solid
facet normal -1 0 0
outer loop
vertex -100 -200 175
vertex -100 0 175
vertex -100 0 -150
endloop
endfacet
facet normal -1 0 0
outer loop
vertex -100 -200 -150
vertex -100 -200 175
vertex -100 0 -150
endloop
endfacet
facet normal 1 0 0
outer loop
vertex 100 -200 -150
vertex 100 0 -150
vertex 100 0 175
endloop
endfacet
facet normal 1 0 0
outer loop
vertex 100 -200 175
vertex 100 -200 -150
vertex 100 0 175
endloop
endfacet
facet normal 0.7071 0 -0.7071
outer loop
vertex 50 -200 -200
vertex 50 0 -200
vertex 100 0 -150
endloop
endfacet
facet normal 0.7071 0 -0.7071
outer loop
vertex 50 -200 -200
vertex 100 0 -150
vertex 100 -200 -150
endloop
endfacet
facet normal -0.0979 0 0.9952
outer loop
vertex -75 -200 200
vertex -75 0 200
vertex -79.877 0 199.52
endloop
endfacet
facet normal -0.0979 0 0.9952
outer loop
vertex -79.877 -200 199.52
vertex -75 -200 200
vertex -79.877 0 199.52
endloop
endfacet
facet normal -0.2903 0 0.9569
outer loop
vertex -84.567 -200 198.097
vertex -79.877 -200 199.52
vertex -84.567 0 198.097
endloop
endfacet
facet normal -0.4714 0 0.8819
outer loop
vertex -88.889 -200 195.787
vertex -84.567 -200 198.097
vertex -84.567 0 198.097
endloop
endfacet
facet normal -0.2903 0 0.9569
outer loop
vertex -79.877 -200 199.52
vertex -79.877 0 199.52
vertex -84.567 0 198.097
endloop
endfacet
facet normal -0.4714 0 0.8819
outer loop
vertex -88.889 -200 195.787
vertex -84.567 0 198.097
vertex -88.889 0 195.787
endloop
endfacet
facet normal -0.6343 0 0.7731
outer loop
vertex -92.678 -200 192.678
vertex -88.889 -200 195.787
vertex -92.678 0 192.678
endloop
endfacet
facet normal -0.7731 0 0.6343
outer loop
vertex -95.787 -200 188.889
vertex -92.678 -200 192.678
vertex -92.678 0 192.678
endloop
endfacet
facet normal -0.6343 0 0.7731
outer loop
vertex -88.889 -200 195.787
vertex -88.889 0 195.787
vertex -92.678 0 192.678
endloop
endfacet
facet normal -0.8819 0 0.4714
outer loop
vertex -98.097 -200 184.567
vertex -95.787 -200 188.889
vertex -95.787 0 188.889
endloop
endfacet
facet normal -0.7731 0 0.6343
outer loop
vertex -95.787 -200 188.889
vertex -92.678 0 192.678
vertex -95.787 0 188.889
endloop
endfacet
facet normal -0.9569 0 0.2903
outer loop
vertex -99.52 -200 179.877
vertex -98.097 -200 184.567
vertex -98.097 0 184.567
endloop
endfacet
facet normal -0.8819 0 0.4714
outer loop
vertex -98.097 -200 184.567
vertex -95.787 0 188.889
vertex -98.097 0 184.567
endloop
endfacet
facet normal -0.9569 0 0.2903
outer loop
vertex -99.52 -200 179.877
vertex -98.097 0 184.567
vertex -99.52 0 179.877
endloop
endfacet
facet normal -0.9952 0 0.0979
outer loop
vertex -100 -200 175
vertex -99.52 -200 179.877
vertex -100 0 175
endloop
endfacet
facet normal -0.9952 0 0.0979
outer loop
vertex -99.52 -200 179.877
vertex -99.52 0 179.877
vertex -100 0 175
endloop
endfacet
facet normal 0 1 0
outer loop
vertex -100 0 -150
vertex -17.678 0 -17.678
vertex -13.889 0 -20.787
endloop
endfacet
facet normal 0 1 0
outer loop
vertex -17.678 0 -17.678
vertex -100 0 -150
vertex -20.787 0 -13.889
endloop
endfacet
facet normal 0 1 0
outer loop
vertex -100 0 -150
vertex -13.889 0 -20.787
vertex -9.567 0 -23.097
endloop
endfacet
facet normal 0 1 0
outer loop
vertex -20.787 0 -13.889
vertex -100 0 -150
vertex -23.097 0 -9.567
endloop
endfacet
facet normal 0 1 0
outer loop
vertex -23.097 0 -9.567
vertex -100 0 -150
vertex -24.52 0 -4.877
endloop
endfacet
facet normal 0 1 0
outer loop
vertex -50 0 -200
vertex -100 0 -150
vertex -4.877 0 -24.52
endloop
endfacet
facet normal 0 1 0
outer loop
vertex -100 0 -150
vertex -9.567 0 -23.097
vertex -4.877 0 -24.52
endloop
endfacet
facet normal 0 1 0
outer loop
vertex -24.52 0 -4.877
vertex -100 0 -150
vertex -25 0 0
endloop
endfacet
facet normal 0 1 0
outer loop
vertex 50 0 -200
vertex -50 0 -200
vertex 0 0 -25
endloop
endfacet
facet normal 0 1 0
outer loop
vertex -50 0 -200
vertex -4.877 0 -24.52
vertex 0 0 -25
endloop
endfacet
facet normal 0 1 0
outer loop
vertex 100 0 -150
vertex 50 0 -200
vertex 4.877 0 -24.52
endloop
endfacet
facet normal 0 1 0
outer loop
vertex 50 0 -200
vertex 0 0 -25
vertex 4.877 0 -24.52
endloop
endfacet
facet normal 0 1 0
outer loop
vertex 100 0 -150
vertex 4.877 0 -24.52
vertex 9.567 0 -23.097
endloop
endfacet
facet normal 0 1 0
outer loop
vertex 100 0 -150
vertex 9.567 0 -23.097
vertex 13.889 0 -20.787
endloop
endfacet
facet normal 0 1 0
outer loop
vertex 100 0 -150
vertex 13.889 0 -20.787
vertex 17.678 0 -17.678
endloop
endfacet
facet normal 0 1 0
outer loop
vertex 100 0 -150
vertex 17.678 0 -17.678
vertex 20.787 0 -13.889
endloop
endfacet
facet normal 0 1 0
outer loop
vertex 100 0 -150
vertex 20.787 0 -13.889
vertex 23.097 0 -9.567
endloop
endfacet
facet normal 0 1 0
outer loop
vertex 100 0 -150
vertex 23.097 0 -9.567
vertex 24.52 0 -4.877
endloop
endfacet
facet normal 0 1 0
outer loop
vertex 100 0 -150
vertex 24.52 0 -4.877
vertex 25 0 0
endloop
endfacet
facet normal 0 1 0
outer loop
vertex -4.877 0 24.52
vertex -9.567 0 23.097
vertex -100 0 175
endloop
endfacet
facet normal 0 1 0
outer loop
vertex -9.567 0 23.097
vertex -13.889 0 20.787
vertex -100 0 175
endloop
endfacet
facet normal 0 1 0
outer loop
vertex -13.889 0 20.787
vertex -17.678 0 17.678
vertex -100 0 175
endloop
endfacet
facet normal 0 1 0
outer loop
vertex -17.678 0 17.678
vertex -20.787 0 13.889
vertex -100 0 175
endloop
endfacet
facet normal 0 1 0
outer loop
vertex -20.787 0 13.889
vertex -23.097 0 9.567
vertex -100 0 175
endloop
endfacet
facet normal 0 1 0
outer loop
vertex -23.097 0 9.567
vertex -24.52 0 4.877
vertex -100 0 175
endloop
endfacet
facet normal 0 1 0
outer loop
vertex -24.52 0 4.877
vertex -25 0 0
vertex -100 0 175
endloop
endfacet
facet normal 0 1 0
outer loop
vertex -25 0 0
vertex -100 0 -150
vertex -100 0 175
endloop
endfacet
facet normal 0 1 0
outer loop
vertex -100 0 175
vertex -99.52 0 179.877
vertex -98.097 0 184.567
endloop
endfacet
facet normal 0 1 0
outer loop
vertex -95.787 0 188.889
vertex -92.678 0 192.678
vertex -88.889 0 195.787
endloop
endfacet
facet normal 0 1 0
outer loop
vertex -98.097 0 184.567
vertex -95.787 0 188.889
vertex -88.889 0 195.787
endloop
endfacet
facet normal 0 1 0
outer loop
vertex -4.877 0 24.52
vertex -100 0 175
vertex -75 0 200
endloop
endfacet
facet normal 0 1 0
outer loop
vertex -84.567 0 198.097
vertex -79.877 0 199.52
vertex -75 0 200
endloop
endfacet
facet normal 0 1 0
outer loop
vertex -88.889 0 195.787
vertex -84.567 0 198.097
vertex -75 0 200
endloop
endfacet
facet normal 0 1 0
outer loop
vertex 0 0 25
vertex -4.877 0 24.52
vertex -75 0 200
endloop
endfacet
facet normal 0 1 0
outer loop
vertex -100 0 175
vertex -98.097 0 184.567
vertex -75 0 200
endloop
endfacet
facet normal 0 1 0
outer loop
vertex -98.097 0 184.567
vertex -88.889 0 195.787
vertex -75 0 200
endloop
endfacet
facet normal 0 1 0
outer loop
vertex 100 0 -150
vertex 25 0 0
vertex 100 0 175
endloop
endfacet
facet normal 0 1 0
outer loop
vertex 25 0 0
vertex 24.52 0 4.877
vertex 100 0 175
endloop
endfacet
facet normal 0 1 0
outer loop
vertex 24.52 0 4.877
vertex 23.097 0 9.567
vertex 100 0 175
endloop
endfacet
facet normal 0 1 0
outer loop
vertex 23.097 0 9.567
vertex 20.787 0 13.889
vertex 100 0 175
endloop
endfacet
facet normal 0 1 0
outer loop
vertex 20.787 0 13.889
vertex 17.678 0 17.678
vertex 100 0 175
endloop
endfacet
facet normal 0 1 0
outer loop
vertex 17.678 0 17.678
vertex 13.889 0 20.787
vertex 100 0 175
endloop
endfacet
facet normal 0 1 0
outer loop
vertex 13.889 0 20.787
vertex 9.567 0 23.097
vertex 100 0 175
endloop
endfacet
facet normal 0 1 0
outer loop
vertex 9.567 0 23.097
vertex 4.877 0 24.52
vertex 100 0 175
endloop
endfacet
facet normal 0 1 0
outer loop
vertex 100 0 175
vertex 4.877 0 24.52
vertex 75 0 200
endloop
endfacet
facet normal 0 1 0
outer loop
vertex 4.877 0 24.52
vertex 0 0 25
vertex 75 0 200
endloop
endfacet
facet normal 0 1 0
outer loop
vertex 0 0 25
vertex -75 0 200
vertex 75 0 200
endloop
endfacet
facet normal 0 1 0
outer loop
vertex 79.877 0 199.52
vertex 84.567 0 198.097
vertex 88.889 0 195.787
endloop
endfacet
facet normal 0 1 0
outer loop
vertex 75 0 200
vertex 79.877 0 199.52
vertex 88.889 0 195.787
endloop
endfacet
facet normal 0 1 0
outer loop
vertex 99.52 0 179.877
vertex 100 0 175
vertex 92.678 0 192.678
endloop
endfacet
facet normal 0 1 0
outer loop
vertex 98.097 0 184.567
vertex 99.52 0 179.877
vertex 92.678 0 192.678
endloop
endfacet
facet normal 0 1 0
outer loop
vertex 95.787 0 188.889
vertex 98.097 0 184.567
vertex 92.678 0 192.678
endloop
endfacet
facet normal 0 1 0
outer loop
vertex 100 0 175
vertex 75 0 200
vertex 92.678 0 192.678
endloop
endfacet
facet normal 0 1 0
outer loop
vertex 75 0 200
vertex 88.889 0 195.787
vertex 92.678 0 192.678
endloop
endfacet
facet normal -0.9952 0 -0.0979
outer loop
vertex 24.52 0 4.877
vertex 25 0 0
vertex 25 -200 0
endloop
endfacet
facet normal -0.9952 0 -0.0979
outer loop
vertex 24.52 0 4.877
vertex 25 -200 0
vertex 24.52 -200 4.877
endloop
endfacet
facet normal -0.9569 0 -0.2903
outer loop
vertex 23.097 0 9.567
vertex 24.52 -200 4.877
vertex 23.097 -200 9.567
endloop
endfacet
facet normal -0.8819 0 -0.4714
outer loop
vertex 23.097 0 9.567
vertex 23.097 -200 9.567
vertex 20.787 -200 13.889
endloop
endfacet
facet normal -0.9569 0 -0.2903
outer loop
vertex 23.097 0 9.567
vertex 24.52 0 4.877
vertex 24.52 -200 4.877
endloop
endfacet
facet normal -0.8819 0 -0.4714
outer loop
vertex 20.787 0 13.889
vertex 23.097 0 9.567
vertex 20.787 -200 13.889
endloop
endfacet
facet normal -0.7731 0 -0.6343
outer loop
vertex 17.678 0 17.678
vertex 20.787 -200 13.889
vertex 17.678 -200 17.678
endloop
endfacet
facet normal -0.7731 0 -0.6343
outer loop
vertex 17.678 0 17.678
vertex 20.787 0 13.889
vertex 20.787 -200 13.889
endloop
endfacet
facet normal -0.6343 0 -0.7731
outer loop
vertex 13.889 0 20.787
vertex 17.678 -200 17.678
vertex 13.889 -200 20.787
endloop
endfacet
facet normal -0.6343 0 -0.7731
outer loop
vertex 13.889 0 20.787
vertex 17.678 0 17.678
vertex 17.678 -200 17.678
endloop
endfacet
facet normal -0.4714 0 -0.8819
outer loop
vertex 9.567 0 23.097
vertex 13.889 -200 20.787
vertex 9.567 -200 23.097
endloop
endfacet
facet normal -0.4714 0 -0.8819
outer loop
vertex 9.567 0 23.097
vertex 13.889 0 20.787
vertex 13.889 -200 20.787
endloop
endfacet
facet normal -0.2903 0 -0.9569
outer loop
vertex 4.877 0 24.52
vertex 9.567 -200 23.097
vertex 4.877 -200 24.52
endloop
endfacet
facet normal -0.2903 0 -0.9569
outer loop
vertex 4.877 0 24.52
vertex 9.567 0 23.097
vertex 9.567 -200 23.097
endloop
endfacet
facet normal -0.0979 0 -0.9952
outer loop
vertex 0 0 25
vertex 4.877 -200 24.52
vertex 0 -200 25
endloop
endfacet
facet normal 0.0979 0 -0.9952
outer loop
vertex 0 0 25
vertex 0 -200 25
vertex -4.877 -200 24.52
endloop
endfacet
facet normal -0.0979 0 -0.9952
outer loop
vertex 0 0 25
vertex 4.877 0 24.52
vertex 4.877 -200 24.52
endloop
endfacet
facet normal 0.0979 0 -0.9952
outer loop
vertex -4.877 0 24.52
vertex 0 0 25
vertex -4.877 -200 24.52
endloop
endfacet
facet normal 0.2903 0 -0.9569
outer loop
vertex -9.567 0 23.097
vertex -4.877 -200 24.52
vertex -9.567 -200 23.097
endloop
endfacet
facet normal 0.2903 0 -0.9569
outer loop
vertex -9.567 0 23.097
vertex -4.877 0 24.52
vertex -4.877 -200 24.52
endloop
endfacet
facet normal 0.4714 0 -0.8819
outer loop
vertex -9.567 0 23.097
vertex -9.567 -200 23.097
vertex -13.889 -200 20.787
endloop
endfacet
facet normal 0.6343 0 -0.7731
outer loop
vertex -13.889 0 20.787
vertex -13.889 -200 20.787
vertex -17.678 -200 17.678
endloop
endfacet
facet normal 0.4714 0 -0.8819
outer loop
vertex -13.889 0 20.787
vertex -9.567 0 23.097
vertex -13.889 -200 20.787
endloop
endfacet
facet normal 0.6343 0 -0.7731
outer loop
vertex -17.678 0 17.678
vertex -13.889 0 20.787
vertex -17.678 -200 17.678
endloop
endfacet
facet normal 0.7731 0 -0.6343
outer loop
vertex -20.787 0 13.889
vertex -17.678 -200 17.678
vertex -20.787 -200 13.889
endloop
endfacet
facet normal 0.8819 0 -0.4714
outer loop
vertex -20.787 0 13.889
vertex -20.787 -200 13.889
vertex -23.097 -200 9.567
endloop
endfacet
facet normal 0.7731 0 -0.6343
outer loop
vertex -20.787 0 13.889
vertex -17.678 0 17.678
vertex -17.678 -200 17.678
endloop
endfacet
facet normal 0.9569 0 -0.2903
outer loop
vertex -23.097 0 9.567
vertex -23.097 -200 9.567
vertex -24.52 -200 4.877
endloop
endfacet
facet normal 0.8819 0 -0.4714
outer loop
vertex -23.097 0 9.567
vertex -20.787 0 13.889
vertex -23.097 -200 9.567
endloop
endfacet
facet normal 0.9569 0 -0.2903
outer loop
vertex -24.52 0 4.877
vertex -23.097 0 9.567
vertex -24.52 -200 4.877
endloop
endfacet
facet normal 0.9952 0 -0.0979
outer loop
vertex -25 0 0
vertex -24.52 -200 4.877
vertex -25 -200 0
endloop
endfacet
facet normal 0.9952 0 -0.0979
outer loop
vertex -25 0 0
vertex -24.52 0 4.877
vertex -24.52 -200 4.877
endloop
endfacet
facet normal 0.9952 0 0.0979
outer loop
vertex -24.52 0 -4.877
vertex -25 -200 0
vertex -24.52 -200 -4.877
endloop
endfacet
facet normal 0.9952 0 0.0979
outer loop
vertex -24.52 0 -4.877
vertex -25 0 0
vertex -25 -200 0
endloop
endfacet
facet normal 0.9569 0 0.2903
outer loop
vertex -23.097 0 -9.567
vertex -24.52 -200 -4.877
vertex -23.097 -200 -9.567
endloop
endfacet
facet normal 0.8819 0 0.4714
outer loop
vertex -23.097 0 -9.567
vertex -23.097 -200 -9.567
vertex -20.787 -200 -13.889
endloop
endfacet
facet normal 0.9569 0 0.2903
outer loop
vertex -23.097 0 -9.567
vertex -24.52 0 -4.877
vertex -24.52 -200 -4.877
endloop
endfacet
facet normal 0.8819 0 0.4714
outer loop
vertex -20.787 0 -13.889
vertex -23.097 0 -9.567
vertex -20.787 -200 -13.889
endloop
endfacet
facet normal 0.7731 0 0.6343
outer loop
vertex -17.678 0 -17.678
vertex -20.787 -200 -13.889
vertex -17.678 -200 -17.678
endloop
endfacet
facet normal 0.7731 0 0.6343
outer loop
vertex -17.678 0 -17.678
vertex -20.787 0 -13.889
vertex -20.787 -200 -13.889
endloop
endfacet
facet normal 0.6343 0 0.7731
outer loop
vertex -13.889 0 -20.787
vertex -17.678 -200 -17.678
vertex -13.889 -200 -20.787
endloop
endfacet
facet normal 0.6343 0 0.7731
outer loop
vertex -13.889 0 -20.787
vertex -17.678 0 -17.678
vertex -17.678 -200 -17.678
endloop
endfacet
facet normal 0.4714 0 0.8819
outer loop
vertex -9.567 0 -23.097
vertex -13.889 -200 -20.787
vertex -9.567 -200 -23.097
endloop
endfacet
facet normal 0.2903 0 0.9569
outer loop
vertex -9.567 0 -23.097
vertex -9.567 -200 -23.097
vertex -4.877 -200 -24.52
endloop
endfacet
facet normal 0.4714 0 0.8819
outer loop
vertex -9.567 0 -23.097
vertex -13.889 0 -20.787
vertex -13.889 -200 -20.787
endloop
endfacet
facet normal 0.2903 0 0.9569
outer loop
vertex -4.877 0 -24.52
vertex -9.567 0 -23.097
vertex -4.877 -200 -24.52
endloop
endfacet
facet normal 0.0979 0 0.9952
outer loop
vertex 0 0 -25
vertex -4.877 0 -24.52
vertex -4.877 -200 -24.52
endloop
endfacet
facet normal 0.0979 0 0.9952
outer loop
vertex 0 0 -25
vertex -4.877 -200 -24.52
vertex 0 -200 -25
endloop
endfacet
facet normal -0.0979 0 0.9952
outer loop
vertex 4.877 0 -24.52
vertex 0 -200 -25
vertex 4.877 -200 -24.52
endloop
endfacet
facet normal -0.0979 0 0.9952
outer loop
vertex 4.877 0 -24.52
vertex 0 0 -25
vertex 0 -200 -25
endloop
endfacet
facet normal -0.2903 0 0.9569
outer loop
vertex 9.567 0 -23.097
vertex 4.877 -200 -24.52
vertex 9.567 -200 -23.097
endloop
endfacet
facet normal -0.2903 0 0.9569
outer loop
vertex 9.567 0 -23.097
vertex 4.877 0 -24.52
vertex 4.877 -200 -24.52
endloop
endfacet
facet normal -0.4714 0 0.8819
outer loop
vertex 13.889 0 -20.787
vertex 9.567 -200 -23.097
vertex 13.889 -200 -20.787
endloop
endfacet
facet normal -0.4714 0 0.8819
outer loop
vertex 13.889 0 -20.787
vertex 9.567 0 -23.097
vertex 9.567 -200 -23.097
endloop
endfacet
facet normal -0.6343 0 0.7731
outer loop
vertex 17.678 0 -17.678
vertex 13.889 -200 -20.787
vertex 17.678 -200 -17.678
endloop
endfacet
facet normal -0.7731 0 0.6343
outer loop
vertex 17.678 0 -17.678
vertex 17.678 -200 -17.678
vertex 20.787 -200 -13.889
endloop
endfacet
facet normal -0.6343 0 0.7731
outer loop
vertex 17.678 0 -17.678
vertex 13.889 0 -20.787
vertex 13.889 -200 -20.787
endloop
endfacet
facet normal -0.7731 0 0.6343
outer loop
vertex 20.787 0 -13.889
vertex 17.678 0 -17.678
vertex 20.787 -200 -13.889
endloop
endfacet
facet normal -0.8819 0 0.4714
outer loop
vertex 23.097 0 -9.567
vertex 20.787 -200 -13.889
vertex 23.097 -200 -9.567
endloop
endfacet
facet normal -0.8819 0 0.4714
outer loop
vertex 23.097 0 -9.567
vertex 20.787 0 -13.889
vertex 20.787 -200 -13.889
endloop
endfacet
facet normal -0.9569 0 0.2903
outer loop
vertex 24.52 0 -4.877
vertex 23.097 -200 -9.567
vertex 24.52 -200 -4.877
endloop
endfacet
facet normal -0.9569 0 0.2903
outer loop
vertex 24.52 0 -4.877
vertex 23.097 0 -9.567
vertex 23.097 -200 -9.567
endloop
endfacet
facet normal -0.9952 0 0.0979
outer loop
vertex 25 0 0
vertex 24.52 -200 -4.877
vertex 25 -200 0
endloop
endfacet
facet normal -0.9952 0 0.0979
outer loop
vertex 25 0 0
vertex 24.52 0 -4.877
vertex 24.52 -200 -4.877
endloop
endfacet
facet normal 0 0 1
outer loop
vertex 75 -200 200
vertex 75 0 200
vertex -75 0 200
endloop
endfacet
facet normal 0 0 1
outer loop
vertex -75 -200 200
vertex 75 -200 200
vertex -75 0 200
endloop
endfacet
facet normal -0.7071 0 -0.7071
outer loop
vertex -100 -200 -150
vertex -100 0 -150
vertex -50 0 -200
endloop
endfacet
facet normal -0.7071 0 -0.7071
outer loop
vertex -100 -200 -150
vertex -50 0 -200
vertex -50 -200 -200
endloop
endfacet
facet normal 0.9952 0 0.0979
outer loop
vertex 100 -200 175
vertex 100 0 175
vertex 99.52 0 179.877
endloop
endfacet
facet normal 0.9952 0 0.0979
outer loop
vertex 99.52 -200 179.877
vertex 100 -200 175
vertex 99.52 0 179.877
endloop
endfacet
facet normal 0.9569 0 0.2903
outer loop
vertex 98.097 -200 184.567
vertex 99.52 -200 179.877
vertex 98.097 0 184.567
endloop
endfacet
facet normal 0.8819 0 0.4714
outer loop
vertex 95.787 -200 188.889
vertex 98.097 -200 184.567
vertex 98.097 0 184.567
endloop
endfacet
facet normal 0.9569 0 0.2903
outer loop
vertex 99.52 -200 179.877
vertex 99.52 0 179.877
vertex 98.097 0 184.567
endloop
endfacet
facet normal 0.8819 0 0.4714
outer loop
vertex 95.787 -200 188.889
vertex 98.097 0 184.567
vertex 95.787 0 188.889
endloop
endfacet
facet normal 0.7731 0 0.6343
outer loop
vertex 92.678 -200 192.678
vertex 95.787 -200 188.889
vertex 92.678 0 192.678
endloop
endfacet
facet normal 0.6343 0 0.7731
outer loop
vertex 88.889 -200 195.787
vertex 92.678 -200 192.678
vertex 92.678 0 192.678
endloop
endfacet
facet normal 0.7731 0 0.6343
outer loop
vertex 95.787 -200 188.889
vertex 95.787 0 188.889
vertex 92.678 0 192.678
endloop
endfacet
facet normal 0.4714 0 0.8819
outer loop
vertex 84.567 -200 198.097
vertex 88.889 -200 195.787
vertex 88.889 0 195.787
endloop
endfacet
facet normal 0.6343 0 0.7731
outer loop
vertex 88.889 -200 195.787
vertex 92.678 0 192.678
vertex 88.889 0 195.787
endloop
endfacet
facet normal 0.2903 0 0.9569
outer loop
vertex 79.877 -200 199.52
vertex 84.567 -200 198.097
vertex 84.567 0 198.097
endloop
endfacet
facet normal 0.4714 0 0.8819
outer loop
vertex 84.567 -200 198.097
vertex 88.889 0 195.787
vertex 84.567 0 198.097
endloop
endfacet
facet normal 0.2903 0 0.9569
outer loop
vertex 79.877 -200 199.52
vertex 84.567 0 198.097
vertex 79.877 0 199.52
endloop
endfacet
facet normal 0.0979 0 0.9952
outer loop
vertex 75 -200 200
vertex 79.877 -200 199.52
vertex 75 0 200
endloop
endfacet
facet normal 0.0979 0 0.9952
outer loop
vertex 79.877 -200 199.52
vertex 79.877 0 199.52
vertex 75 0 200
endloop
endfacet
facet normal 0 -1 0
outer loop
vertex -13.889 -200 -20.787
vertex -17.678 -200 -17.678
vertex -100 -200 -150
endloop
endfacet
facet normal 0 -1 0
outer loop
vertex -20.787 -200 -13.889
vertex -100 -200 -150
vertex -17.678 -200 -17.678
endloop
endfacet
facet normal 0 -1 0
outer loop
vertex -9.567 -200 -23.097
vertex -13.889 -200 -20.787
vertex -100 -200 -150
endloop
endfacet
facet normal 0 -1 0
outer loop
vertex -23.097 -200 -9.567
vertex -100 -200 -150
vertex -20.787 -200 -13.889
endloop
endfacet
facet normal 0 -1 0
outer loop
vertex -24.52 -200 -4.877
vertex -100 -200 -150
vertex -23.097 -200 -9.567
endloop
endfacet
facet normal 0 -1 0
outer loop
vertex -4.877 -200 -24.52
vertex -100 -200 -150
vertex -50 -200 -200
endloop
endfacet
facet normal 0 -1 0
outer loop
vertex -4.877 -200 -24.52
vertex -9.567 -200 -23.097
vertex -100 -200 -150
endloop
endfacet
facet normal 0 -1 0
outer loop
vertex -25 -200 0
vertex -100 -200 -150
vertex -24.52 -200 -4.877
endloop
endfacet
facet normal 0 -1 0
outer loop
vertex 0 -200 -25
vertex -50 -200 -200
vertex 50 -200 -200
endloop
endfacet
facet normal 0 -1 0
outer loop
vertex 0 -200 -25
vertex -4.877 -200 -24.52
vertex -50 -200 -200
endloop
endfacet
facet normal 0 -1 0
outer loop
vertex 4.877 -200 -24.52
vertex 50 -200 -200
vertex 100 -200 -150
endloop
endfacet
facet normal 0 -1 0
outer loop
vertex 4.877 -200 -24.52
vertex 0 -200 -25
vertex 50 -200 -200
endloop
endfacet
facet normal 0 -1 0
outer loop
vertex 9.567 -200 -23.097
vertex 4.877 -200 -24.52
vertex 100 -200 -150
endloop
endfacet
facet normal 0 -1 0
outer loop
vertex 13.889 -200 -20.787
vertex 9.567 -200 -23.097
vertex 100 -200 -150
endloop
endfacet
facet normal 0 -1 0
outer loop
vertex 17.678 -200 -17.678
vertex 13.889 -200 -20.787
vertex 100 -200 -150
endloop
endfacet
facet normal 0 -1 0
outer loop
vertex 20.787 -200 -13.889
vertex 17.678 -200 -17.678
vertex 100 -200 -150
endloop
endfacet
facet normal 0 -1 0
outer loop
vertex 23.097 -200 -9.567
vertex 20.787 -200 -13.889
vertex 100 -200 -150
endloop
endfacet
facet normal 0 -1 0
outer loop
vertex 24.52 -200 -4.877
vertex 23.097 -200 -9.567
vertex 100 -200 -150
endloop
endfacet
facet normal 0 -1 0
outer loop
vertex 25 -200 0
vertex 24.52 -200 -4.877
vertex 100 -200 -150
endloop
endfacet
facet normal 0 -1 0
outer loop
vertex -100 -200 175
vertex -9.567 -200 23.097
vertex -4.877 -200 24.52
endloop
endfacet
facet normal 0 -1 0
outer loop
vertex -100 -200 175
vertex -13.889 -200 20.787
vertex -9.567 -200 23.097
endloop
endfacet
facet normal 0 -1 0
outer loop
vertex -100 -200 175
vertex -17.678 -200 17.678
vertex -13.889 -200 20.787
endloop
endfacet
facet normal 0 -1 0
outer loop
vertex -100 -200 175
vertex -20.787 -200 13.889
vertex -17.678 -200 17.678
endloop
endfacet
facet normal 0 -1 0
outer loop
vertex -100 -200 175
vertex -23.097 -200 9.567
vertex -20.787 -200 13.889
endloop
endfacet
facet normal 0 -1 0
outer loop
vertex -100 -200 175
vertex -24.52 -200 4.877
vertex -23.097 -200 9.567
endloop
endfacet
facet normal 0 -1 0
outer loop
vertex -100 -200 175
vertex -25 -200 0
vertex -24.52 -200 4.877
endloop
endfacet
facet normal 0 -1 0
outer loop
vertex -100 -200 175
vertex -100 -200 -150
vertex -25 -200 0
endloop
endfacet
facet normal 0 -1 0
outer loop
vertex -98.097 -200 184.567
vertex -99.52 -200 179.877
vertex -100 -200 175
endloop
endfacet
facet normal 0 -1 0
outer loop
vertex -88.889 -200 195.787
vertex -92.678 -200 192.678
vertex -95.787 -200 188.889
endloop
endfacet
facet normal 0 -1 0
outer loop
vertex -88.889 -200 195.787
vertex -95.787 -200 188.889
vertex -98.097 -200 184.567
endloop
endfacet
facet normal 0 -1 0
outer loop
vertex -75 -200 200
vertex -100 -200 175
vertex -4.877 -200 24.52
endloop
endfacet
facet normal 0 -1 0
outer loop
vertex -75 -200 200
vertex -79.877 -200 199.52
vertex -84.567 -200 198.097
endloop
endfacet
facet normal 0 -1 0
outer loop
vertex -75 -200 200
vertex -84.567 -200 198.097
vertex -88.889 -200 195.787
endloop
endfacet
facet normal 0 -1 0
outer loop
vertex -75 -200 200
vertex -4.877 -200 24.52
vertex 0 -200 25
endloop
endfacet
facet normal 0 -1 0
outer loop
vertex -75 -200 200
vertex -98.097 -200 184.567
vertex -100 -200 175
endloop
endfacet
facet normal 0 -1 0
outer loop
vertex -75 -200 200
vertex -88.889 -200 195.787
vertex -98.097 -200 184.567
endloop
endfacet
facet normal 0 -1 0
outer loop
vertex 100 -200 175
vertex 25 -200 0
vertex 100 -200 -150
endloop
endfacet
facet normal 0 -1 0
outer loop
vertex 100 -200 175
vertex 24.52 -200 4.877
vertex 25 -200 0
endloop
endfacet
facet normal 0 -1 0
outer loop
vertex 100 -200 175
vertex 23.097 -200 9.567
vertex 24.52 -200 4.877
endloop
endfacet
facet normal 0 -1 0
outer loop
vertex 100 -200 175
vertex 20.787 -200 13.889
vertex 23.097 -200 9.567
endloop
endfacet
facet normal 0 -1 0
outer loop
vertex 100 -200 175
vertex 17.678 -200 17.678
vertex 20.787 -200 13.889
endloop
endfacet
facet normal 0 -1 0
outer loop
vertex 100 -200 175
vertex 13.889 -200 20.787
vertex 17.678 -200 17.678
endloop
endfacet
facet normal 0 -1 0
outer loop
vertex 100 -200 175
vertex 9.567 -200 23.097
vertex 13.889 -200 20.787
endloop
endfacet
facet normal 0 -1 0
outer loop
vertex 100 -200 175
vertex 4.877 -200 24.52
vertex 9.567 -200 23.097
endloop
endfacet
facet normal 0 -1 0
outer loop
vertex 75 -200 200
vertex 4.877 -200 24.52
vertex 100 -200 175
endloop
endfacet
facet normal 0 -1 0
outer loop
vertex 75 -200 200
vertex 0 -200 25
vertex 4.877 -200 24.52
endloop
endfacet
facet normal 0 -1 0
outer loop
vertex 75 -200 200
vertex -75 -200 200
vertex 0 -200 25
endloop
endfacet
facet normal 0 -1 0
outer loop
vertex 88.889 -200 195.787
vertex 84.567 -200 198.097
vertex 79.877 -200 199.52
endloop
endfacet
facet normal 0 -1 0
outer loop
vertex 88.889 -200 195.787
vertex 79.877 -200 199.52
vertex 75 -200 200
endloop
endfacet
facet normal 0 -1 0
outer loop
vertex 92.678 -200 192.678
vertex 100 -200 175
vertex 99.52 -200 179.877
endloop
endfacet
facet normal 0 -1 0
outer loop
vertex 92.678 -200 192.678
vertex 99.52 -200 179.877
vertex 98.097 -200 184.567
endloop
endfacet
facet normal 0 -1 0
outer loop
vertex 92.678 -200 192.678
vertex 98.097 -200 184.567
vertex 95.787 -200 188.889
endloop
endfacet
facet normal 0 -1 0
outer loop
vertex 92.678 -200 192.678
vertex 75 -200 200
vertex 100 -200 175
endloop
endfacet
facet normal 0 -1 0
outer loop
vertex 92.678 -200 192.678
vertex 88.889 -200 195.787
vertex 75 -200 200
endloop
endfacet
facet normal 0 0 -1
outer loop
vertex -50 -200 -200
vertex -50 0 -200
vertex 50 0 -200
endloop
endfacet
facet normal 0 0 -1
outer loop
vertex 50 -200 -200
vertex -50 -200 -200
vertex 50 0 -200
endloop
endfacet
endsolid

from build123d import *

# Parameters (mm, degrees)
F0_R     = 25
F1_DEPTH = 200
F2_SIZE  = 50


with BuildPart() as f1:
    # F0 (on Front) → F1 (new body)
    with BuildSketch(Plane.XZ):
        with BuildLine():
            ThreePointArc((100, 175), (92.67767, 192.67767), (75, 200))
            Line((75, 200), (-75, 200))
            ThreePointArc((-75, 200), (-92.67767, 192.67767), (-100, 175))
            Line((-100, 175), (-100, -200))
            Line((-100, -200), (100, -200))
            Line((100, -200), (100, 175))
        make_face()
        Circle(F0_R, mode=Mode.SUBTRACT)
    extrude(amount=F1_DEPTH)

    # F2
    f2_edges = [f1.edges().sort_by_distance(p)[0] for p in [
        (100, -100, -200),
        (-100, -100, -200),
    ]]
    chamfer(f2_edges, length=F2_SIZE)


solid = f1.part
